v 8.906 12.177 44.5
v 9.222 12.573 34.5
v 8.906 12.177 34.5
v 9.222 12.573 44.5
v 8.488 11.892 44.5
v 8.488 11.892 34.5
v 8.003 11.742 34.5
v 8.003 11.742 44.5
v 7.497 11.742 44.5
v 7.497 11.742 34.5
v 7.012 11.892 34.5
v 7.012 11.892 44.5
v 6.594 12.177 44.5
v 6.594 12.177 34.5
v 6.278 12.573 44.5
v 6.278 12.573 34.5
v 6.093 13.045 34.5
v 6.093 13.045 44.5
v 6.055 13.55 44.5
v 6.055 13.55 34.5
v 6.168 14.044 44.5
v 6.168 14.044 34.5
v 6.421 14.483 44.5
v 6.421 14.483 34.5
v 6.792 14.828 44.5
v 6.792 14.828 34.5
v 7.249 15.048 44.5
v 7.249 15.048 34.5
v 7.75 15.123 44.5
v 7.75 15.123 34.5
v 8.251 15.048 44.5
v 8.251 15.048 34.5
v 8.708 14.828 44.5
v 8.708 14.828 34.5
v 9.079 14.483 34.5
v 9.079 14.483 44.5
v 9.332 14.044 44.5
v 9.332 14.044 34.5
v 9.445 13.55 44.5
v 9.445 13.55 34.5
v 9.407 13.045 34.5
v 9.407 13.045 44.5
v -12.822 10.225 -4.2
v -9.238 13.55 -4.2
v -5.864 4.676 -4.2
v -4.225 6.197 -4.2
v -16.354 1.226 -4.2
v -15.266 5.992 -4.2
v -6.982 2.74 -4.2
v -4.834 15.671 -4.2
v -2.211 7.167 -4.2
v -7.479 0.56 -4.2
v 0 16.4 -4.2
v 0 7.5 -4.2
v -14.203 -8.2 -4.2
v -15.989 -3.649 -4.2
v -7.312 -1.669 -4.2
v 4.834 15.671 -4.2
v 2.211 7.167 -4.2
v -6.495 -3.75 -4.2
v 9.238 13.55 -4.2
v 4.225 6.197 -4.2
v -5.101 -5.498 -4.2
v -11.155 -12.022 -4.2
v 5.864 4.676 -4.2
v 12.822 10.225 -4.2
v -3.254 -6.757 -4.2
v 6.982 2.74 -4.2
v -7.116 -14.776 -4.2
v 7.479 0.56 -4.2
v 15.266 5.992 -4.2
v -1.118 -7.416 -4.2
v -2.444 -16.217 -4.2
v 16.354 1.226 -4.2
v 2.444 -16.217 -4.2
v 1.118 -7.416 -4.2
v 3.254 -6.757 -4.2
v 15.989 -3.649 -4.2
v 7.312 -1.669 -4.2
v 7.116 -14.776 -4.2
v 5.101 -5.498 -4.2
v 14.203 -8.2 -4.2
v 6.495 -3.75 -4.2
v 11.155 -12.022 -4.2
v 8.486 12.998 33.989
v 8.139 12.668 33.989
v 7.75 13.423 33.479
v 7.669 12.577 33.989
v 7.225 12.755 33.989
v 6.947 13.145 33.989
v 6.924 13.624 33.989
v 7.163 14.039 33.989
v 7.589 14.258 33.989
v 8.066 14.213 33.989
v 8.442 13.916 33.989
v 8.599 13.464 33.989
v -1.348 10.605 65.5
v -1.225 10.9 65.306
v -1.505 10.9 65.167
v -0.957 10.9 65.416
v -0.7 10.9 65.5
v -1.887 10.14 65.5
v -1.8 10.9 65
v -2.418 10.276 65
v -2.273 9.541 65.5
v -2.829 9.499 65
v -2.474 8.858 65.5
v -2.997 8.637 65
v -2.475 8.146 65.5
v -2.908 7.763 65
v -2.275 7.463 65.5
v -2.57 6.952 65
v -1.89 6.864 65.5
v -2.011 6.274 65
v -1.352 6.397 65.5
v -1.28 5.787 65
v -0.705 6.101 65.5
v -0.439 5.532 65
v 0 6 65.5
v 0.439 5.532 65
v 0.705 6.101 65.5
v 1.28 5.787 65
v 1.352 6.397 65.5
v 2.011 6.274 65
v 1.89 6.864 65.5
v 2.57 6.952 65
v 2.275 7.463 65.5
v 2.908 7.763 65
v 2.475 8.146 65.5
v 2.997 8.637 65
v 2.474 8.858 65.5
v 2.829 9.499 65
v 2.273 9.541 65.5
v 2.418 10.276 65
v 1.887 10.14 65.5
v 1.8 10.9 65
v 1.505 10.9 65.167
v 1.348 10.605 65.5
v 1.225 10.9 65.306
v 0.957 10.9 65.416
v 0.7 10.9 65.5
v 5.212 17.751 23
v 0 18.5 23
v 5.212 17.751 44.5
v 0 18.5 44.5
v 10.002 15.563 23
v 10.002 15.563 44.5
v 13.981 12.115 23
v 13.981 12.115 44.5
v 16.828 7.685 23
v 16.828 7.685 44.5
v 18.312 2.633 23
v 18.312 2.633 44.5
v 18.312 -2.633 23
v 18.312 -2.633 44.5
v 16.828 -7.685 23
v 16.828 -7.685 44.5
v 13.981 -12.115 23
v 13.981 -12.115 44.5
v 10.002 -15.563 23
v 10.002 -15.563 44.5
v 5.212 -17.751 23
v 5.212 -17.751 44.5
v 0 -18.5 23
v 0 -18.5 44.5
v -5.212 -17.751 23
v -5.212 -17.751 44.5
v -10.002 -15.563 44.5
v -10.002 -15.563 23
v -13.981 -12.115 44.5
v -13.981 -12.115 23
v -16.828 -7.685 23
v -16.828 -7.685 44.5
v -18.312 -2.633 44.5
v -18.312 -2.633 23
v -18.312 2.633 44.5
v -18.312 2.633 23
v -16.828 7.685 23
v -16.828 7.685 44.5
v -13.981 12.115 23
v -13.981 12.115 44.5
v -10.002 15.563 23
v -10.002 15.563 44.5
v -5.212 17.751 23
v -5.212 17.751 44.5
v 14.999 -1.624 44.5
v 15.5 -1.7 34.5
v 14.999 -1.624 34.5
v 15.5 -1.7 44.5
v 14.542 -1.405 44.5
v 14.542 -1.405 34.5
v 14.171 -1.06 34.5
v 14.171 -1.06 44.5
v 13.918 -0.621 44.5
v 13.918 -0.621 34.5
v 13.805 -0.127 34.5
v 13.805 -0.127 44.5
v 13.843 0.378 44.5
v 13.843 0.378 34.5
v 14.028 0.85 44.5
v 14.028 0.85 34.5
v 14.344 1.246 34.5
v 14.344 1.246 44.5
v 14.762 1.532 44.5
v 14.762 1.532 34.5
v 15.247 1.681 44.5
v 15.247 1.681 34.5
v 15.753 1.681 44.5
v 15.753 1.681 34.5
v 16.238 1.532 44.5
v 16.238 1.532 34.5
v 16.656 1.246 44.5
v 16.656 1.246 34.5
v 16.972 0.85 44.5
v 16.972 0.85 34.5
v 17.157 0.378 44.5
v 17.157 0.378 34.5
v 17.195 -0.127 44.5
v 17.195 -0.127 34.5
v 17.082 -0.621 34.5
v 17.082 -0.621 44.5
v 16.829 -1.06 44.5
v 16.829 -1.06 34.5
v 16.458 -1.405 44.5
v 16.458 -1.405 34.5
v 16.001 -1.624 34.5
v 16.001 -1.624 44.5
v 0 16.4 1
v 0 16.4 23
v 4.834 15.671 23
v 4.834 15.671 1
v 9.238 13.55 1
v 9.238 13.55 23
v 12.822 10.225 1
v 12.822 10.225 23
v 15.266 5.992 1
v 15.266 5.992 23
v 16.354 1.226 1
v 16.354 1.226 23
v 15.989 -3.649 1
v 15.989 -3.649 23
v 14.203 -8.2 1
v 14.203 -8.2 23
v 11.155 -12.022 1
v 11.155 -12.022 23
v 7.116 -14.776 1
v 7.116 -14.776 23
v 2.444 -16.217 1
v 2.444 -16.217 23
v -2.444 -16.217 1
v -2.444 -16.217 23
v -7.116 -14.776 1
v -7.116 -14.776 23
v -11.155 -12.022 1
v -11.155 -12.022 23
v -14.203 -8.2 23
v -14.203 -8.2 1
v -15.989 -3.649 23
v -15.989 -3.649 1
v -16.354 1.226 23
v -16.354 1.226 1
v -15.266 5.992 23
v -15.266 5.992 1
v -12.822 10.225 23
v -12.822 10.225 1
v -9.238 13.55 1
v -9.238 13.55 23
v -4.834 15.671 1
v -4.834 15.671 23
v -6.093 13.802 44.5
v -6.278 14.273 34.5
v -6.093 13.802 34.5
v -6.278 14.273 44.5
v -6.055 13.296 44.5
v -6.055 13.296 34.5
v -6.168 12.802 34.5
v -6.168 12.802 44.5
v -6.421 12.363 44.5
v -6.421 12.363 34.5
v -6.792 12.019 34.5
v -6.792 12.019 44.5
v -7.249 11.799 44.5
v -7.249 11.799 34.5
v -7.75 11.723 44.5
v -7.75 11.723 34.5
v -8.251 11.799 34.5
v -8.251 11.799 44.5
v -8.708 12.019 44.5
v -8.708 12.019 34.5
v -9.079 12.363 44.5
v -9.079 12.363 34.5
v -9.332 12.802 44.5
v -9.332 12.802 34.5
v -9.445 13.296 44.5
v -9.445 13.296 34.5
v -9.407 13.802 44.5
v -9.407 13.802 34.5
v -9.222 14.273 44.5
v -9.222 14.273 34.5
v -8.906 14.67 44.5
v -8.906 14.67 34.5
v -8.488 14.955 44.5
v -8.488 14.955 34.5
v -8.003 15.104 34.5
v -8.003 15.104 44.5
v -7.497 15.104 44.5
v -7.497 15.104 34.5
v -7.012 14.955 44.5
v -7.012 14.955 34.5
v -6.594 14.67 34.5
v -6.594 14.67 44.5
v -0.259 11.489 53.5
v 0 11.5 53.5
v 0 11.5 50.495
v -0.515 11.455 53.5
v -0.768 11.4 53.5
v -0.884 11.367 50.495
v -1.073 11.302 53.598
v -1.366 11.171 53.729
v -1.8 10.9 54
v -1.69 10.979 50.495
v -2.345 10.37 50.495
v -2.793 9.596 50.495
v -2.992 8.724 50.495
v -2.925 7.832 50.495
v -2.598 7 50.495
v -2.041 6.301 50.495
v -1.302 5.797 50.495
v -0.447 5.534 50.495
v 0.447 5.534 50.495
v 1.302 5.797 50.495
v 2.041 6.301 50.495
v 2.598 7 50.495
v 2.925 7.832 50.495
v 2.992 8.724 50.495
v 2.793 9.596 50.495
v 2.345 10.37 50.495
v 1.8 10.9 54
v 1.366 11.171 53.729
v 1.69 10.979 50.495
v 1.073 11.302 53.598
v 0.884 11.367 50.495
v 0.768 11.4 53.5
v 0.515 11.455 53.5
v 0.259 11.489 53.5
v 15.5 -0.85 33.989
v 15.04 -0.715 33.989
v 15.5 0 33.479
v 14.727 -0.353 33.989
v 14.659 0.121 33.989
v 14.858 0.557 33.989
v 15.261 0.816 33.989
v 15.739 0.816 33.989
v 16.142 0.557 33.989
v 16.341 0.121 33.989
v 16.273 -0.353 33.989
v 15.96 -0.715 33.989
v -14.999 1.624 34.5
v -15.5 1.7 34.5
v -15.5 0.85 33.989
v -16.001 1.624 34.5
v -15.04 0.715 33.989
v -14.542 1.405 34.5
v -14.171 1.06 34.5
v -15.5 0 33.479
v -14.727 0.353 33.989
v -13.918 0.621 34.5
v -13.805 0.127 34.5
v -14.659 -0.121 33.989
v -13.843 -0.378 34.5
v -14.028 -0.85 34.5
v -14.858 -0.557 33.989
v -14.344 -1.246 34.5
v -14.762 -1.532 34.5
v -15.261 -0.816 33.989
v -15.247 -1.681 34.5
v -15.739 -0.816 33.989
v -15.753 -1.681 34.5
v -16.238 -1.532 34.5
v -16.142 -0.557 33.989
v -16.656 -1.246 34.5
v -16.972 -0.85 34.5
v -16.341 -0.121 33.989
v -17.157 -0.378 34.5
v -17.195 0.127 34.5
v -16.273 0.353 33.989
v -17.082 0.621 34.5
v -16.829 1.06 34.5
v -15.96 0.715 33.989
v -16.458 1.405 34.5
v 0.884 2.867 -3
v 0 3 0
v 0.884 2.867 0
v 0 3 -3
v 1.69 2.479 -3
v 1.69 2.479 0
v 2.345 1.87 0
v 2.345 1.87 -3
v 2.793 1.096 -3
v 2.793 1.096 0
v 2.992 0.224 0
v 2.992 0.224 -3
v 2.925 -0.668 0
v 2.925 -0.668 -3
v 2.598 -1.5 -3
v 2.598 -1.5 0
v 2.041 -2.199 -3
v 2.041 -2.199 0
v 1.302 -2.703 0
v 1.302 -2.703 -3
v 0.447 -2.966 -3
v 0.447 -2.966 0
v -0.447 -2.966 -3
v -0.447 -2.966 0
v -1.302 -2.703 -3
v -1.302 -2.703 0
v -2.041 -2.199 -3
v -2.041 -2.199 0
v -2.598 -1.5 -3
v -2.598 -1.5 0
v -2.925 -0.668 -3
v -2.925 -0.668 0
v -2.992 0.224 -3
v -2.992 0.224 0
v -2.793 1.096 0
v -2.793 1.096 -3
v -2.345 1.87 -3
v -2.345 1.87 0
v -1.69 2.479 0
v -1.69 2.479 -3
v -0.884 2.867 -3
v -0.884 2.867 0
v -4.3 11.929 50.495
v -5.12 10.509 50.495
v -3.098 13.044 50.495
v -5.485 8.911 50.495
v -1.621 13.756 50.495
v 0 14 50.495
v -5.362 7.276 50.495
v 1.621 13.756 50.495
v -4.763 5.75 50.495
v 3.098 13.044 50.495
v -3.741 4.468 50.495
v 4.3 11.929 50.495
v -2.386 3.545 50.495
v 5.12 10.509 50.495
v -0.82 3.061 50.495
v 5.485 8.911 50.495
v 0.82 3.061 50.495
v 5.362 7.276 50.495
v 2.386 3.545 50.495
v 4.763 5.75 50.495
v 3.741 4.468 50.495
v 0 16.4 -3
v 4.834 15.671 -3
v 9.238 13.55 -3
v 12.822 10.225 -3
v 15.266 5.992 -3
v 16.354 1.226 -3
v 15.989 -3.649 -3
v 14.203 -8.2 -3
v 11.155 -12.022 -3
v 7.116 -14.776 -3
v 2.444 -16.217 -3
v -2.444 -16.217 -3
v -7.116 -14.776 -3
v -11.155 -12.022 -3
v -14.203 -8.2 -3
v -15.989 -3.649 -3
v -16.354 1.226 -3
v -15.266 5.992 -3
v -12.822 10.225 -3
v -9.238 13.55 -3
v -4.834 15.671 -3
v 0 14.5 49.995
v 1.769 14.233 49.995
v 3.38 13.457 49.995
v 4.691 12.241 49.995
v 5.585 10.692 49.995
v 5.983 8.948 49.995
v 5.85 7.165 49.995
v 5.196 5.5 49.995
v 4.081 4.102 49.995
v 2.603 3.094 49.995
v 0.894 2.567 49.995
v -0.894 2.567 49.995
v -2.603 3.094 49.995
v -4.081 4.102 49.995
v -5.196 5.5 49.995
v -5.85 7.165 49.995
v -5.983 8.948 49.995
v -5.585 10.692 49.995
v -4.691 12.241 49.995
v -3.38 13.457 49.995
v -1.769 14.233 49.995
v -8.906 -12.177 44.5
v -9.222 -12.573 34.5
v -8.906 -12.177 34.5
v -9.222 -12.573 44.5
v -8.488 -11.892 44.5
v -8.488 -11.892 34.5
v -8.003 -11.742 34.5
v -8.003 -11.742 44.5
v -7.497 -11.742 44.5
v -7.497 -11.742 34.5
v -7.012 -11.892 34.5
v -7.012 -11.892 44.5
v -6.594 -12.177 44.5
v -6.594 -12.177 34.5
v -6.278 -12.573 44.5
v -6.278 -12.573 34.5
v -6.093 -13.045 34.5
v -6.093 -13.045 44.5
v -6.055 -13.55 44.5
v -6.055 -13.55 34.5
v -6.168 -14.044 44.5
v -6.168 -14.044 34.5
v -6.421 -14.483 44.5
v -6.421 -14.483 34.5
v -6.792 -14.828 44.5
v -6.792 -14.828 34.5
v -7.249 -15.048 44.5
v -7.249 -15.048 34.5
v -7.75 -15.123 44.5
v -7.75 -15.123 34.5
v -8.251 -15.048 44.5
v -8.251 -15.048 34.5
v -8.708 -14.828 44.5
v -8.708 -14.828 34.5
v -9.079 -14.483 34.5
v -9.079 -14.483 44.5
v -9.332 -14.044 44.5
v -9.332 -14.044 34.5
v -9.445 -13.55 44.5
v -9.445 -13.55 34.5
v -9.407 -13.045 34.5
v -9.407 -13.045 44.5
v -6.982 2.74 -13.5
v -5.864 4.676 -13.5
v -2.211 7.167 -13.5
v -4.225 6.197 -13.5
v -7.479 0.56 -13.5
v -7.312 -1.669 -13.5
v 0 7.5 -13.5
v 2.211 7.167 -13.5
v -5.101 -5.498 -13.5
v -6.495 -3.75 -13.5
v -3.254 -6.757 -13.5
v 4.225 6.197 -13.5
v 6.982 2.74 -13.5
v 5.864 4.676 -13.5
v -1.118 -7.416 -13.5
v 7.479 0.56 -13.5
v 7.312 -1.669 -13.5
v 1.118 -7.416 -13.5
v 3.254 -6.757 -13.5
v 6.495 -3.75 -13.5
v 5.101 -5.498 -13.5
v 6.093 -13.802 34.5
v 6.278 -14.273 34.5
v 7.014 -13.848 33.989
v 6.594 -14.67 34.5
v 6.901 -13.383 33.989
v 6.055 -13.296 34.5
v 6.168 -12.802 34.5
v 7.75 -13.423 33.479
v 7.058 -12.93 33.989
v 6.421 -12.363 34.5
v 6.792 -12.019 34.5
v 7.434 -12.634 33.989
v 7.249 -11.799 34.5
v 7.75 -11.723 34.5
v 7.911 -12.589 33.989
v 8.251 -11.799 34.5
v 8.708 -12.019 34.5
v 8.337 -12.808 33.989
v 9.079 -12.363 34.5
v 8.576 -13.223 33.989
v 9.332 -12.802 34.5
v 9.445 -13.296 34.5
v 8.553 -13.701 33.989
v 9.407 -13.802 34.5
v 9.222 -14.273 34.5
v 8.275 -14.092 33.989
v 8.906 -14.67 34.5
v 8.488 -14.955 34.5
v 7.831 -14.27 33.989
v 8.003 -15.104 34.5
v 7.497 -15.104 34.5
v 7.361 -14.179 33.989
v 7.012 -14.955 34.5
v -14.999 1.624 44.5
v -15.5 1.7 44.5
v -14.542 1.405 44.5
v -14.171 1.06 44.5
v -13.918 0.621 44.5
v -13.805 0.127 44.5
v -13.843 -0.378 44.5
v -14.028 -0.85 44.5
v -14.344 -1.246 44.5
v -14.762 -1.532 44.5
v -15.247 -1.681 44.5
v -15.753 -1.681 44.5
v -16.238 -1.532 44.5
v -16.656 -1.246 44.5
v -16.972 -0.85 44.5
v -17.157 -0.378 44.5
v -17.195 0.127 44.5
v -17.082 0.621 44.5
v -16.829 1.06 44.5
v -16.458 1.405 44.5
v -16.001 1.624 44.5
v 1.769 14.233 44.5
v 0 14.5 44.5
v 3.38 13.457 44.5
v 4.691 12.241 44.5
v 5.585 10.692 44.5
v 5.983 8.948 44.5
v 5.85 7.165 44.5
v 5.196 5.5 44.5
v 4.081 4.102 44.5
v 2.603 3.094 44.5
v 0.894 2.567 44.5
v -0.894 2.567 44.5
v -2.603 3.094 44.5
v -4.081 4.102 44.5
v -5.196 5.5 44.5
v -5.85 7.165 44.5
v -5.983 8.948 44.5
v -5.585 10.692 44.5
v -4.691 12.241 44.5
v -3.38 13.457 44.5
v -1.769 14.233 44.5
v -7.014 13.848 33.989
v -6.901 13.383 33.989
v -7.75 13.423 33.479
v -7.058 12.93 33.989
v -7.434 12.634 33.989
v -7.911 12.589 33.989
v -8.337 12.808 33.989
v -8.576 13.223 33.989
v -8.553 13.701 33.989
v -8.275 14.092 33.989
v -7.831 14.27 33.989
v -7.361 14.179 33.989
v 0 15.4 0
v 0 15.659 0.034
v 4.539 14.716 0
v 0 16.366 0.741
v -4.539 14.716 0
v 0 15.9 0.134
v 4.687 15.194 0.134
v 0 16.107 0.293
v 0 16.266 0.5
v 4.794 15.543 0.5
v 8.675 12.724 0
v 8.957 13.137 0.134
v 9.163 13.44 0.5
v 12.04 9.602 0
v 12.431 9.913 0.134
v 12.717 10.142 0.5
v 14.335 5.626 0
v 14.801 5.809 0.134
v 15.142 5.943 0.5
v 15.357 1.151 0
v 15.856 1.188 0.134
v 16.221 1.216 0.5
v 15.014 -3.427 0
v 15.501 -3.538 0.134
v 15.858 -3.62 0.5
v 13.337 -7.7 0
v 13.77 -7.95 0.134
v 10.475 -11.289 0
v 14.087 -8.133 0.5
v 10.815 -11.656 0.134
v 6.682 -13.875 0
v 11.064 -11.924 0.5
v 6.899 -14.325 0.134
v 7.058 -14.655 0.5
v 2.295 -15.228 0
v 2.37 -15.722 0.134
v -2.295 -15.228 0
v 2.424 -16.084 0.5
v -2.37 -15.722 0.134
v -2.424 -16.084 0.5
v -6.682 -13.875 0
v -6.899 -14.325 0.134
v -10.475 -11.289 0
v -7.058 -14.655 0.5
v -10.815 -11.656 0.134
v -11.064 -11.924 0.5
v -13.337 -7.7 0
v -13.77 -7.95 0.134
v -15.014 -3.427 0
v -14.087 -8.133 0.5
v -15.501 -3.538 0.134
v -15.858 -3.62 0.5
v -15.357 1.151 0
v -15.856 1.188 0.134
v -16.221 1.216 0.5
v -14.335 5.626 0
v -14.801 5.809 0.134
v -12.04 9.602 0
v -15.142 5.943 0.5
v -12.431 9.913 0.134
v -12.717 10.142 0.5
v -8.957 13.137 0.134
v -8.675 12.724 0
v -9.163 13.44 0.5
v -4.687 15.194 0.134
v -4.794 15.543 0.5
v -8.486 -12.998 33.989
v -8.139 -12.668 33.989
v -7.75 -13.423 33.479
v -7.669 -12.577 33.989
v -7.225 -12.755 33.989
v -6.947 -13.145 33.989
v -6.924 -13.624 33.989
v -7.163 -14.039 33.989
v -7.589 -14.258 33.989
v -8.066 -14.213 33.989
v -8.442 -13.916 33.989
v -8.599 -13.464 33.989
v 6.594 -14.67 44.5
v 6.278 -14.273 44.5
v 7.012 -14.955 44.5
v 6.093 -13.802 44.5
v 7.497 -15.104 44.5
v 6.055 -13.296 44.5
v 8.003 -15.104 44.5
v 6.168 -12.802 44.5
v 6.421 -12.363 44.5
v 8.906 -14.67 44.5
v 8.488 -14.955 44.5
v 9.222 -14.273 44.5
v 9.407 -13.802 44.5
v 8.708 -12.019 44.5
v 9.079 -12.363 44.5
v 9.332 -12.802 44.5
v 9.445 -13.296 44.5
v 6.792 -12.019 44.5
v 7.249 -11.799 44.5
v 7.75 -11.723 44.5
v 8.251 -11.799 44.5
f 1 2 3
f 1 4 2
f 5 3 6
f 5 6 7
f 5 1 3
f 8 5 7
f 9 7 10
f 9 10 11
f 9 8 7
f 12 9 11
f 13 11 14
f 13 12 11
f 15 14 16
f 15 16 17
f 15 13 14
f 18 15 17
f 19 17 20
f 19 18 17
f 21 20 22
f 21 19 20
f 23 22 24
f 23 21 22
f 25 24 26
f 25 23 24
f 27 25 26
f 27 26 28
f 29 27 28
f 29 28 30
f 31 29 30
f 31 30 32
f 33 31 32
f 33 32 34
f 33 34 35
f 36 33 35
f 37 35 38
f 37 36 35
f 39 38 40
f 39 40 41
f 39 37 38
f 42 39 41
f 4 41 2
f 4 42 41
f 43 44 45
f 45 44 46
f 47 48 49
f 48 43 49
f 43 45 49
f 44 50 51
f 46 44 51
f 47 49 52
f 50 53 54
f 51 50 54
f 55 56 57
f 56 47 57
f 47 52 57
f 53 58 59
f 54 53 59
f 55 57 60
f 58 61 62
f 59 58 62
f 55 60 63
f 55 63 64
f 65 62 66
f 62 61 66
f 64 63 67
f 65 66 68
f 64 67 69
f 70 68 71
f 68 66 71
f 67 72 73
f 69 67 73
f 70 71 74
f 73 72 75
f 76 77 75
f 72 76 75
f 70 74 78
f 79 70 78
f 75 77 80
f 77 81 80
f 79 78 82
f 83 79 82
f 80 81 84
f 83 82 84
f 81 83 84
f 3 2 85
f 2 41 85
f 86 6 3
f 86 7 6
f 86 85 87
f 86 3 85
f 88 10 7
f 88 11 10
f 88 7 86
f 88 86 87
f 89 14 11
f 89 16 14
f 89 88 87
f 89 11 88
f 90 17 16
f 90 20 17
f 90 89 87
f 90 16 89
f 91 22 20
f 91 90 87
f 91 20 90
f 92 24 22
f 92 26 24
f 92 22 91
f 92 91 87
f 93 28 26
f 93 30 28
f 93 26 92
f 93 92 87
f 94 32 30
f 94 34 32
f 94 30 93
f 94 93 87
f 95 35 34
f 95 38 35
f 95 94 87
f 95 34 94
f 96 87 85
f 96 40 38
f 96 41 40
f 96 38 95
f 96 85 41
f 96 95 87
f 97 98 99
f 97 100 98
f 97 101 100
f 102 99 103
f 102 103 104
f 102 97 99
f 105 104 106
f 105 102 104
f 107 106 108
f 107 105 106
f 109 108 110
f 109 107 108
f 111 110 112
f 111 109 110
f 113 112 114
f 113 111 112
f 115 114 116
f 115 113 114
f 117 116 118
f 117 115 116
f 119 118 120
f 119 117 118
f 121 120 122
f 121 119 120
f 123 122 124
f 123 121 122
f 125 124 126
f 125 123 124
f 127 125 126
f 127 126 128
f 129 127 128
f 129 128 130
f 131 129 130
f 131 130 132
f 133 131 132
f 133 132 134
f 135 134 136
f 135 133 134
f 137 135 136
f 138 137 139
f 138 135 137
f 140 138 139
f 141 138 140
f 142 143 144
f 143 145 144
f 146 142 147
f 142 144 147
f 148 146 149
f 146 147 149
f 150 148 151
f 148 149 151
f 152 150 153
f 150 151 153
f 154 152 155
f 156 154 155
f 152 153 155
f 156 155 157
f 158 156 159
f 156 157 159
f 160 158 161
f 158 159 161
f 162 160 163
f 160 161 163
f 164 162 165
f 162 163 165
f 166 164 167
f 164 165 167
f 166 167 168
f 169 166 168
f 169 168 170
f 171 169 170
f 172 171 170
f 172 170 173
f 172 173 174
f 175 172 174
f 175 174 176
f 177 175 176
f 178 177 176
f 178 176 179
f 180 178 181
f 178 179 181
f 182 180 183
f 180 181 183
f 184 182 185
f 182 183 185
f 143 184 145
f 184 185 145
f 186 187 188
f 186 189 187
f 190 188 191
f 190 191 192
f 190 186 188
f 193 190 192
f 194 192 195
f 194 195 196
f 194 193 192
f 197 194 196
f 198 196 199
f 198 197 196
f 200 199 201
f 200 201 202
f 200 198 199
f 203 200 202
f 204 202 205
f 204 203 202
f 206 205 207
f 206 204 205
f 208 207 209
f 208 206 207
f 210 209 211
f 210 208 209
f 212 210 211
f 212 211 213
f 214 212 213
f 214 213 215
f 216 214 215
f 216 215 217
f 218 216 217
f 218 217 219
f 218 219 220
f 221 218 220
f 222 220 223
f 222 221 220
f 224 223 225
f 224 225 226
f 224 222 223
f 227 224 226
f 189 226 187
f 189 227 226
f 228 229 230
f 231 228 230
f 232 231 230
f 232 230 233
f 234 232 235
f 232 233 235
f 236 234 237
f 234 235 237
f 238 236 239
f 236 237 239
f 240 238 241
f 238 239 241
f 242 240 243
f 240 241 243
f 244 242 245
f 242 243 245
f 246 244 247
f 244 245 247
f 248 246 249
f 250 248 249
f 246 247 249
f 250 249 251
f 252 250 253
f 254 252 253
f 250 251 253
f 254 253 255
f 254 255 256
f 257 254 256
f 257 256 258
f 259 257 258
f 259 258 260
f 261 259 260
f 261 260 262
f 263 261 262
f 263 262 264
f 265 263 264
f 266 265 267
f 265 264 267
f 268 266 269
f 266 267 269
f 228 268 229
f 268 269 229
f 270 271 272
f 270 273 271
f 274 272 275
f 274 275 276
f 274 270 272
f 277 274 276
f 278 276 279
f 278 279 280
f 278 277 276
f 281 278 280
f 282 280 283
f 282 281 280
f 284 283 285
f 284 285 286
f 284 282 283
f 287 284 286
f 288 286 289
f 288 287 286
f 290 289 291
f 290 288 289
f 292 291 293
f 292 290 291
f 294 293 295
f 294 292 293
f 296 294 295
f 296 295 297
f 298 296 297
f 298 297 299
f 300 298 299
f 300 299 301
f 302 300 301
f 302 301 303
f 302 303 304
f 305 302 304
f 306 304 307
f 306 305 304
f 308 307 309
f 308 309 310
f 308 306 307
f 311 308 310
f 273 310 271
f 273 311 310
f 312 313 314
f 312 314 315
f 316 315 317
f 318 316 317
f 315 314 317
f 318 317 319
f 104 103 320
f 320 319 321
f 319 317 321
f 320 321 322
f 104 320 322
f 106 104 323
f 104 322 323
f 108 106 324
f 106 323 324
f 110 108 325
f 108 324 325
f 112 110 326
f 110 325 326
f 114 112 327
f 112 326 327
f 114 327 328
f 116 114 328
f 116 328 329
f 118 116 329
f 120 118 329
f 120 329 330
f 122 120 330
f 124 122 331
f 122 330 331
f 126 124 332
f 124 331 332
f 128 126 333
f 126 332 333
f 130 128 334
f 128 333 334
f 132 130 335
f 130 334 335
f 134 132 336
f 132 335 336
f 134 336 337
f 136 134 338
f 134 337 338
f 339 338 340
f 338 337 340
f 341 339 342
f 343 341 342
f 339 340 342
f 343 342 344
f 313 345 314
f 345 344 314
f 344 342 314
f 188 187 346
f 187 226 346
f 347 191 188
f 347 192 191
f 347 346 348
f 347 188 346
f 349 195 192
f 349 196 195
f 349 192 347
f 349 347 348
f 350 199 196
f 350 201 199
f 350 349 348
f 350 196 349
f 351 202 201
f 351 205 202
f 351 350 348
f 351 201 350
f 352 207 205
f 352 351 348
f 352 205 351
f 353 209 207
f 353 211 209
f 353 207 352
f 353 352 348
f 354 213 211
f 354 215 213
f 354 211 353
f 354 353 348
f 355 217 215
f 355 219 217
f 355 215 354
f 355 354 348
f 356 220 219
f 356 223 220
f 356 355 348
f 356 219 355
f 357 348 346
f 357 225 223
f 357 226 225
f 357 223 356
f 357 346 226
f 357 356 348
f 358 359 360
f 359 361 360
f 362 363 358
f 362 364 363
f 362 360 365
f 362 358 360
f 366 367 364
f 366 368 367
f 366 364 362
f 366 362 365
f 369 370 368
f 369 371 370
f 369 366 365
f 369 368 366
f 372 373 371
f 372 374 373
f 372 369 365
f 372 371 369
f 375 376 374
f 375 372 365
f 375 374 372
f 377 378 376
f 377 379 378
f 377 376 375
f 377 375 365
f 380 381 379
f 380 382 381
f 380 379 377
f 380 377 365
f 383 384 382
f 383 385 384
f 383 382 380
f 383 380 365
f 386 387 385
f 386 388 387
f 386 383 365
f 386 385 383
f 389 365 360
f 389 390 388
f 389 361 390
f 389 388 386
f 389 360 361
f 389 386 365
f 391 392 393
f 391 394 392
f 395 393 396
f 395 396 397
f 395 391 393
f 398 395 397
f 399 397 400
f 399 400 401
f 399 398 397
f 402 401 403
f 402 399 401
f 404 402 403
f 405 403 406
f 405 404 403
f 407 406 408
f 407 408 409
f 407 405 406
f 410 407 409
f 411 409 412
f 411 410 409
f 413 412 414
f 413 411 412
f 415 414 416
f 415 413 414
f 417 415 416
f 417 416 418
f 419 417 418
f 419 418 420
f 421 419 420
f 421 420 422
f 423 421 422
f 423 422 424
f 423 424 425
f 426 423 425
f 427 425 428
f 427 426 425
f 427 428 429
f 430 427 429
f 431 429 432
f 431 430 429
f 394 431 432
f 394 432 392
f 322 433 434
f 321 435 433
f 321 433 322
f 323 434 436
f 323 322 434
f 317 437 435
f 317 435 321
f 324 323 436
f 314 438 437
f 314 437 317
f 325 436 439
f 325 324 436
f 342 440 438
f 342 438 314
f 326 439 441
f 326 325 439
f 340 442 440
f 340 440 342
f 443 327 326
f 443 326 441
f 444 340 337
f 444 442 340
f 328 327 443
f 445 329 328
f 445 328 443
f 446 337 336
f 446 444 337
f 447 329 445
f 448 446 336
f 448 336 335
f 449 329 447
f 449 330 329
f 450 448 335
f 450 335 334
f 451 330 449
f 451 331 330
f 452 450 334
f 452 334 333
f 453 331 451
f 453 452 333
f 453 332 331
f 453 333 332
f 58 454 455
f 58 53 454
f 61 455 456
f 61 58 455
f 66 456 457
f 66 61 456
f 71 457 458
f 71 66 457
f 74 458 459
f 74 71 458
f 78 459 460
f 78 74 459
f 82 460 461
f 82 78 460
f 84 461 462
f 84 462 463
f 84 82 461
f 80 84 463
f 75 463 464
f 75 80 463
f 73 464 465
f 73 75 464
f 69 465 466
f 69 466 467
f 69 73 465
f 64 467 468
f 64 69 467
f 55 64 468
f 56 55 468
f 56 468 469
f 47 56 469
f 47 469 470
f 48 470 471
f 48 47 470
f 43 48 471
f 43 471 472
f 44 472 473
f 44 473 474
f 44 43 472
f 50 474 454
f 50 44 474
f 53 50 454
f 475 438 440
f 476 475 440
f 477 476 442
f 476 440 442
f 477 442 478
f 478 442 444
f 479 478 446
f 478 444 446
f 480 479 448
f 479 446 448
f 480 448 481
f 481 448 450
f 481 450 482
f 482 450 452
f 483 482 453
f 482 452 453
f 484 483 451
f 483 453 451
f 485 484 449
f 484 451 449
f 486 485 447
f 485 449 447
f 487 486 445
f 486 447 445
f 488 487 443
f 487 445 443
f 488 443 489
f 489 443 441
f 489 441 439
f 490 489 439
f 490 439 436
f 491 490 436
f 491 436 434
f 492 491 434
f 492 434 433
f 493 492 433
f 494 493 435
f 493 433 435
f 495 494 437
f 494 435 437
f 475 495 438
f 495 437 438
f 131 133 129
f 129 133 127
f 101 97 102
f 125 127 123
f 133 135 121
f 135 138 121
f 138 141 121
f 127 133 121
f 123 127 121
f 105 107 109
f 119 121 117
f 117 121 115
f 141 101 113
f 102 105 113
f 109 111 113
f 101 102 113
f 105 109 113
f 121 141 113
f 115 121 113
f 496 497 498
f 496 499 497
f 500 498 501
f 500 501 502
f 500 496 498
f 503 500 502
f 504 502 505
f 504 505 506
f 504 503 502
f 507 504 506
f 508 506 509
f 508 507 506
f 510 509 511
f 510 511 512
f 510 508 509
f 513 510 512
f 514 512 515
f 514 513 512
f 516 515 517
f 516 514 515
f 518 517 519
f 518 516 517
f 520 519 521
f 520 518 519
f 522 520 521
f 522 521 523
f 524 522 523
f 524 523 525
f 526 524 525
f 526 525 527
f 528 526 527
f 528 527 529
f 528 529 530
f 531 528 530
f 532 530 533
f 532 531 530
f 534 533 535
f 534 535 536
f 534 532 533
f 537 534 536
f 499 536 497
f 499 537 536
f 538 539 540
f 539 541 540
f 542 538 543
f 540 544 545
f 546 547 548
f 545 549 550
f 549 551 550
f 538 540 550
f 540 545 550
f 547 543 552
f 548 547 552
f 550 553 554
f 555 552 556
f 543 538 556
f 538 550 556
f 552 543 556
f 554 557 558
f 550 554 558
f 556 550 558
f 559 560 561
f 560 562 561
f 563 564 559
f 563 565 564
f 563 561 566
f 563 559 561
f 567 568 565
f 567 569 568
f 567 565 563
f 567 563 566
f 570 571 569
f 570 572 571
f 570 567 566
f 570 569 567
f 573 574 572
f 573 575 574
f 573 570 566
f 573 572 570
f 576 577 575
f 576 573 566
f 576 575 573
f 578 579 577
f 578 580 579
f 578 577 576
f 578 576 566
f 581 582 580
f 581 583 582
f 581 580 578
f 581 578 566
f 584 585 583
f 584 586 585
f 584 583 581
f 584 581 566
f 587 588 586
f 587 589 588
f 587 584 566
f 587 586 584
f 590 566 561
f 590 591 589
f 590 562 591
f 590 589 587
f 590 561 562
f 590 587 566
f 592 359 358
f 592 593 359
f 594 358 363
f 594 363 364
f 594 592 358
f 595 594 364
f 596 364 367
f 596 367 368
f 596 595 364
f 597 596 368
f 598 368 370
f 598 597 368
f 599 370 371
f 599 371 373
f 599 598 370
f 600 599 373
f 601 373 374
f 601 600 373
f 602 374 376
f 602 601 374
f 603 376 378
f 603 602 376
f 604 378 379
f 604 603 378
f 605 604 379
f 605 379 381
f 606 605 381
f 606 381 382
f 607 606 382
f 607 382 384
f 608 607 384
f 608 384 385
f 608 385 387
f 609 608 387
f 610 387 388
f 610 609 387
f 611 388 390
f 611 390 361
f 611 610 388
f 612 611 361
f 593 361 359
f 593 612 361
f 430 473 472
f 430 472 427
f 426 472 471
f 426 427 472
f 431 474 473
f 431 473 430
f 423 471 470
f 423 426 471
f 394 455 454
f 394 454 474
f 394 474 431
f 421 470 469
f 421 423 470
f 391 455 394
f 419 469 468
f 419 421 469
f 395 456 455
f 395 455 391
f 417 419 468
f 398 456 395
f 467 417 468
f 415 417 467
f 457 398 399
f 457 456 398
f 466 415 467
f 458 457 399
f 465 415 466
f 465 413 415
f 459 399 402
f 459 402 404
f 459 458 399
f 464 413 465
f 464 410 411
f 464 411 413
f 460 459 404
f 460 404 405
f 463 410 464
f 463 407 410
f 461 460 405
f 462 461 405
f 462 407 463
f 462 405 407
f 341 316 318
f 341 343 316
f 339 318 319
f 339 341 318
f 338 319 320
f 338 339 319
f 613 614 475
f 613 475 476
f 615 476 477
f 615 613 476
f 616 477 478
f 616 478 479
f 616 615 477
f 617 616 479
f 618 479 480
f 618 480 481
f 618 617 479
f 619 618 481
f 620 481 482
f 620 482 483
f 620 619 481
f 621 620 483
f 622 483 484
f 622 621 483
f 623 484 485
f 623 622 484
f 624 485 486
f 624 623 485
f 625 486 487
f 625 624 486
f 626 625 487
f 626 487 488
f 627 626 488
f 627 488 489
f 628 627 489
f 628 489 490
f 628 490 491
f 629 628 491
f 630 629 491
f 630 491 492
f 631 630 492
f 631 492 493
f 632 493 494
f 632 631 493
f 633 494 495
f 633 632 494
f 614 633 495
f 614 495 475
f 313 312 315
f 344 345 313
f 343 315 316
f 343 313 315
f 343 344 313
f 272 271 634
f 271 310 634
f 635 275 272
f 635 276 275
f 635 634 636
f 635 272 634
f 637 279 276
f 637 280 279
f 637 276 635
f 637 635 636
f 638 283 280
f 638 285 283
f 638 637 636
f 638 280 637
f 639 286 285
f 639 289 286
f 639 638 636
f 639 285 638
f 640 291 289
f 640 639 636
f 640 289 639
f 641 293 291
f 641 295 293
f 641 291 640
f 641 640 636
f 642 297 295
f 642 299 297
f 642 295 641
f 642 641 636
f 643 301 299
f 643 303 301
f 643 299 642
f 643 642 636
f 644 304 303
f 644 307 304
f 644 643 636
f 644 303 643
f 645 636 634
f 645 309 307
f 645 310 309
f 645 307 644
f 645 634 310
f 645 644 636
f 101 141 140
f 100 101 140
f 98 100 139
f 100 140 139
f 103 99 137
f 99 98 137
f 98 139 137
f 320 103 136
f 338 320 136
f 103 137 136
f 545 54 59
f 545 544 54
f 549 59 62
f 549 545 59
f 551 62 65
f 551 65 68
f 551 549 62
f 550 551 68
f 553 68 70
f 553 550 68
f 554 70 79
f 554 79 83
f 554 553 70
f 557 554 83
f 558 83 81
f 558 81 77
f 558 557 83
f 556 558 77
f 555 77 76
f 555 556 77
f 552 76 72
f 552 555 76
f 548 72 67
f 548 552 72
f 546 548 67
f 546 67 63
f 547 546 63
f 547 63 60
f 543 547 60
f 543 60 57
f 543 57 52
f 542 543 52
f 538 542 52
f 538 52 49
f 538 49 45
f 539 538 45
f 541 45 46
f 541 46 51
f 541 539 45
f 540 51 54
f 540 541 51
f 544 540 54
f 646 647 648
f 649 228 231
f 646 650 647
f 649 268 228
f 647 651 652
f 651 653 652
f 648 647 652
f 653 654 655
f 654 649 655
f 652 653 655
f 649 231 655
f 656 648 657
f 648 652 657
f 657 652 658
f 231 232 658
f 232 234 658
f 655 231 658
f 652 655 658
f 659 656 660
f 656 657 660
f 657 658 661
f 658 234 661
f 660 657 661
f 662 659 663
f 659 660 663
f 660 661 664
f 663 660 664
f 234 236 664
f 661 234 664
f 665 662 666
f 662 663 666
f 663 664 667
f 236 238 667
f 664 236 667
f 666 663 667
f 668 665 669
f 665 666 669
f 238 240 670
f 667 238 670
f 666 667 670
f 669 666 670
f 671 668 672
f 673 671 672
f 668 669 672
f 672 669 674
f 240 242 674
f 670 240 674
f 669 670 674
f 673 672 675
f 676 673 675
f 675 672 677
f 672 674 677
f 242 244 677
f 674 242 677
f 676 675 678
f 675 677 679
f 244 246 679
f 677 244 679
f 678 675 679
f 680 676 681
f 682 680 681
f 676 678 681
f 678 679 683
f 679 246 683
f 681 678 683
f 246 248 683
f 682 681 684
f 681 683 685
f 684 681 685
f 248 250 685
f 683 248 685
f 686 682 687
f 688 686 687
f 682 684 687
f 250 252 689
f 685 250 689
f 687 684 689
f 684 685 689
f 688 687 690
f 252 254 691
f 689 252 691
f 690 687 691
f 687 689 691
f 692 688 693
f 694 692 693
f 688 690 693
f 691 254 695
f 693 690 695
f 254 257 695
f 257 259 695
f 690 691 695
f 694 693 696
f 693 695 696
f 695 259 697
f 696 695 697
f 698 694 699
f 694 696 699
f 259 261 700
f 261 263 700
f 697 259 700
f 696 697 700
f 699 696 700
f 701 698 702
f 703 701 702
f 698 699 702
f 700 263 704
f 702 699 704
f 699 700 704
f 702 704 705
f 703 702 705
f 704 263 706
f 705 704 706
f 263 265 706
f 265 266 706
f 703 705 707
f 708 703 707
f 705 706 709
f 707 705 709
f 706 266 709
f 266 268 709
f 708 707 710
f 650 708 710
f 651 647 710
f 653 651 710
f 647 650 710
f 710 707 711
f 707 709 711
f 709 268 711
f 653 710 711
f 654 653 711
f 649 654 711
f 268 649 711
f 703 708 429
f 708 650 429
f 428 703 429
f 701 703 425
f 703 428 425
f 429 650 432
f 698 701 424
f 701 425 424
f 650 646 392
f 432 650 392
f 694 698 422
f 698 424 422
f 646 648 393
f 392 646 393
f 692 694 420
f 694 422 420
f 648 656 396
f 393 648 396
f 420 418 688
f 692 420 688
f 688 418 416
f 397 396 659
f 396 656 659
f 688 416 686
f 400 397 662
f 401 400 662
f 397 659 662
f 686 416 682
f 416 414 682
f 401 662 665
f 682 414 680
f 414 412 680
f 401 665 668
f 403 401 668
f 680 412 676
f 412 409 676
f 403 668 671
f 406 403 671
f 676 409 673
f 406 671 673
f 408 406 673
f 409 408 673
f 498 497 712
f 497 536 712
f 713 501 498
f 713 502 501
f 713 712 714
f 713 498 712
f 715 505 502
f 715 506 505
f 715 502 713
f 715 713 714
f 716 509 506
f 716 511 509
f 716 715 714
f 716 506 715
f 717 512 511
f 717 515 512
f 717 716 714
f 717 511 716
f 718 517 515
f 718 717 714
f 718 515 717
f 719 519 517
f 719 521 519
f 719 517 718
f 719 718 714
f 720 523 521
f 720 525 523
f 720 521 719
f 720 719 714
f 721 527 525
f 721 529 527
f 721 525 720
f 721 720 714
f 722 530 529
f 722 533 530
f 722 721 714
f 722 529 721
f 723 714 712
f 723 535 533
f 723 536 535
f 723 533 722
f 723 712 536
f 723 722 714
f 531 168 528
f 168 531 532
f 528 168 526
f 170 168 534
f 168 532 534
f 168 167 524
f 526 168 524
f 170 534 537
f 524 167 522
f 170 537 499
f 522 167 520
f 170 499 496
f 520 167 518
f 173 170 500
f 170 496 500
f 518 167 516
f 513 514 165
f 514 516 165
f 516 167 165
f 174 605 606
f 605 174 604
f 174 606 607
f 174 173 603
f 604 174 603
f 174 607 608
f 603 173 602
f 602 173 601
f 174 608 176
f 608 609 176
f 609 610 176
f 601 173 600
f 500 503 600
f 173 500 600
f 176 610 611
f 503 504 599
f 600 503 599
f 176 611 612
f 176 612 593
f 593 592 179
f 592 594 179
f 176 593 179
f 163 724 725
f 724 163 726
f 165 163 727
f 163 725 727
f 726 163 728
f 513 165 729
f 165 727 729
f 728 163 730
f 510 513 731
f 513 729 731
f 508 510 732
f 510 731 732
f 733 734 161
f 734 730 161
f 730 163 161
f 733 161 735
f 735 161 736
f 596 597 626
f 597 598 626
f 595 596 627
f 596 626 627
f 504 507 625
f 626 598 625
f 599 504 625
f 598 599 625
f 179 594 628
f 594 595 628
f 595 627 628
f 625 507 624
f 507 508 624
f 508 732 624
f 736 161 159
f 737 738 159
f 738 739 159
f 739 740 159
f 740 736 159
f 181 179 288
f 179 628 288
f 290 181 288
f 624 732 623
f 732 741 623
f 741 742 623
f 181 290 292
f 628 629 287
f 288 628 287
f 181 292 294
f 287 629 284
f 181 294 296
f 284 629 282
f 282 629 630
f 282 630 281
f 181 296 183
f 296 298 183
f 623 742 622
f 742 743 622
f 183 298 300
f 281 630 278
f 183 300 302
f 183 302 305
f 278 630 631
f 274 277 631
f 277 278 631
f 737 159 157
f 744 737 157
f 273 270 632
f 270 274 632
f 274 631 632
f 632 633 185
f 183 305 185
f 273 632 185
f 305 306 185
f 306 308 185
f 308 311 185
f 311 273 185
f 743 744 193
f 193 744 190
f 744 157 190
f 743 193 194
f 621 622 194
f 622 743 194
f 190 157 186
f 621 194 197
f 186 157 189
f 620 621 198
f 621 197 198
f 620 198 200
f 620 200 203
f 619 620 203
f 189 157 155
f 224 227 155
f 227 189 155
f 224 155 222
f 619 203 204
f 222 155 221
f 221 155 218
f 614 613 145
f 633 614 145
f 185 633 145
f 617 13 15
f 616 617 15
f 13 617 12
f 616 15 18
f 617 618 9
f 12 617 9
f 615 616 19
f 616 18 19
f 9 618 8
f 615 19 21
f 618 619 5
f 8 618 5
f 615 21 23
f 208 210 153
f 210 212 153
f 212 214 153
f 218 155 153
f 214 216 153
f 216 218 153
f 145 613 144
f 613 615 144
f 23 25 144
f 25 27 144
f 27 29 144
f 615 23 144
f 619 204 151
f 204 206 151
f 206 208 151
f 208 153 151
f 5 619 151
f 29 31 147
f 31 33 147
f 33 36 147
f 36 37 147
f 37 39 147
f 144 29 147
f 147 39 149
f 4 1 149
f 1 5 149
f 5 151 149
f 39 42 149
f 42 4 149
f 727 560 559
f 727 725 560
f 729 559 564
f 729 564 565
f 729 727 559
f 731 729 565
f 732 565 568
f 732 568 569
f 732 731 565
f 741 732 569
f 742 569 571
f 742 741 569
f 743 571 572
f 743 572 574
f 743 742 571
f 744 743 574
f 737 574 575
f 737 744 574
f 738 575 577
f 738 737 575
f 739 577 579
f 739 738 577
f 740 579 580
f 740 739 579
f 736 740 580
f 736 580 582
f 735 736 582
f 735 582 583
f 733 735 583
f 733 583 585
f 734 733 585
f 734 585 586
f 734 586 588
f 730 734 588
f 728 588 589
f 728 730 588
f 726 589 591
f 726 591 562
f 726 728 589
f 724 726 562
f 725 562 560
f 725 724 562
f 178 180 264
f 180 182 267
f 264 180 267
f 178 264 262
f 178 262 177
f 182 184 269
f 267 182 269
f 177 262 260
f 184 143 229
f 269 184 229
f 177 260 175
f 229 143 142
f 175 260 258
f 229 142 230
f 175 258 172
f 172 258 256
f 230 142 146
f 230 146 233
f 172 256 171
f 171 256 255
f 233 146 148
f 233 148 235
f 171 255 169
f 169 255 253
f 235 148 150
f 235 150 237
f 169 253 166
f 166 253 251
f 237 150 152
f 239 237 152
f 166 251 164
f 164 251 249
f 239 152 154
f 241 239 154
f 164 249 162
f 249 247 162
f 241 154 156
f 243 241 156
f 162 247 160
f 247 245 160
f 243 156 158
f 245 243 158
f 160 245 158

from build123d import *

# Parameters (mm, degrees)
ESQUISSE3_W                  = 5.995341806
ESQUISSE3_H                  = 6
ESQUISSE4_W                  = 15.004658194
ESQUISSE4_H                  = 3
ESQUISSE5_W                  = 5
ESQUISSE5_H                  = 1
ENL_V_MAT_EXTRU_1_DEPTH      = 12
CHANFREIN1_SIZE              = 0.5
ESQUISSE6_W                  = 3
ESQUISSE6_H                  = 3
ESQUISSE7_W                  = 1.2
ESQUISSE7_H                  = 16.4
ESQUISSE8_W                  = 9.3
ESQUISSE8_H                  = 7.5
R_P_TITION_CIRCULAIRE1_COUNT = 6
CONG_1_R                     = 1
CHANFREIN2_SIZE              = 0.5


with BuildPart() as part:
    # Esquisse1 → Révolution1 (revolve)
    with BuildSketch(Plane(origin=(0, 0, 0), x_dir=(0, 0, -1), z_dir=(1, 0, 0))):
        Polygon((0, 0), (0, 16.4), (-23, 16.4), (-23, 18.5), (-44.5, 18.5), (-44.5, 0), align=None)
    revolve(axis=Axis((0, 0, 44.5), (0, 0, -1)))

    # Esquisse3 → Révolution2 (revolve)
    with BuildSketch(Plane(origin=(0, 0, 0), x_dir=(0, 0, -1), z_dir=(1, 0, 0))):
        with Locations((-47.497670903, 11.5)):
            Rectangle(ESQUISSE3_W, ESQUISSE3_H)
    revolve(axis=Axis((0, 8.5, 50.495341806), (0, 0, -1)))

    # Esquisse4 → Révolution3 (revolve)
    with BuildSketch(Plane(origin=(0, 0, 0), x_dir=(0, 0, -1), z_dir=(1, 0, 0))):
        with Locations((-57.997670903, 10)):
            Rectangle(ESQUISSE4_W, ESQUISSE4_H)
    revolve(axis=Axis((0, 8.5, 50.495341806), (0, 0, 1)))

    # Esquisse5 → Enlèv. mat.-Extru.1 (cut)
    with BuildSketch(Plane.XY.offset(65.5)):
        with Locations((0, 11.4)):
            Rectangle(ESQUISSE5_W, ESQUISSE5_H)
    extrude(amount=-ENL_V_MAT_EXTRU_1_DEPTH, mode=Mode.SUBTRACT)

    # Chanfrein1
    chanfrein1_edges = [part.edges().sort_by_distance(p)[0] for p in [
        (0, 5.5, 65.5),
        (0, 10.9, 53.5),
    ]]
    chamfer(chanfrein1_edges, length=CHANFREIN1_SIZE)

    # Esquisse6 → Révolution4 (revolve)
    with BuildSketch(Plane(origin=(0, 0, 0), x_dir=(0, 0, -1), z_dir=(1, 0, 0))):
        with Locations((1.5, 1.5)):
            Rectangle(ESQUISSE6_W, ESQUISSE6_H)
    revolve(axis=Axis((0, 0, 0), (0, 0, -1)))

    # Esquisse7 → Révolution5 (revolve)
    with BuildSketch(Plane(origin=(0, 0, 0), x_dir=(0, 0, -1), z_dir=(1, 0, 0))):
        with Locations((3.6, 8.2)):
            Rectangle(ESQUISSE7_W, ESQUISSE7_H)
    revolve(axis=Axis((0, 0, -3), (0, 0, -1)))

    # Esquisse8 → Révolution6 (revolve)
    with BuildSketch(Plane(origin=(0, 0, 0), x_dir=(0, 0, -1), z_dir=(1, 0, 0))):
        with Locations((8.85, 3.75)):
            Rectangle(ESQUISSE8_W, ESQUISSE8_H)
    revolve(axis=Axis((0, 0, -4.2), (0, 0, -1)))

    # Esquisse12 → Dégagement M31 (revolve, cut)
    with BuildSketch(Plane(origin=(15.5, 0, 44.5), x_dir=(0, -1, 0), z_dir=(1, 0, 0))):
        Polygon((0, 0), (0, 11.021463052), (1.7, 10), (1.7, 0), align=None)
    d_gagement_m31 = revolve(axis=Axis((15.5, 0, 50.85), (0, 0, -1)), mode=Mode.SUBTRACT)

    # Répétition circulaire1: Dégagement M31 ×6 about axis
    r_p_tition_circulaire1_axis = Axis((0, 0, 0), (0, 0, 1))
    for i in range(1, R_P_TITION_CIRCULAIRE1_COUNT):
        add(d_gagement_m31.rotate(r_p_tition_circulaire1_axis, i * 360 / R_P_TITION_CIRCULAIRE1_COUNT), mode=Mode.SUBTRACT)

    # Congé1
    cong_1_edges = [part.edges().sort_by_distance(p)[0] for p in [
        (0, -16.4, 0),
    ]]
    fillet(cong_1_edges, radius=CONG_1_R)

    # Chanfrein2
    chanfrein2_edges = [part.edges().sort_by_distance(p)[0] for p in [
        (0, 2.5, 50.495341806),
    ]]
    chamfer(chanfrein2_edges, length=CHANFREIN2_SIZE)


solid = part.part
